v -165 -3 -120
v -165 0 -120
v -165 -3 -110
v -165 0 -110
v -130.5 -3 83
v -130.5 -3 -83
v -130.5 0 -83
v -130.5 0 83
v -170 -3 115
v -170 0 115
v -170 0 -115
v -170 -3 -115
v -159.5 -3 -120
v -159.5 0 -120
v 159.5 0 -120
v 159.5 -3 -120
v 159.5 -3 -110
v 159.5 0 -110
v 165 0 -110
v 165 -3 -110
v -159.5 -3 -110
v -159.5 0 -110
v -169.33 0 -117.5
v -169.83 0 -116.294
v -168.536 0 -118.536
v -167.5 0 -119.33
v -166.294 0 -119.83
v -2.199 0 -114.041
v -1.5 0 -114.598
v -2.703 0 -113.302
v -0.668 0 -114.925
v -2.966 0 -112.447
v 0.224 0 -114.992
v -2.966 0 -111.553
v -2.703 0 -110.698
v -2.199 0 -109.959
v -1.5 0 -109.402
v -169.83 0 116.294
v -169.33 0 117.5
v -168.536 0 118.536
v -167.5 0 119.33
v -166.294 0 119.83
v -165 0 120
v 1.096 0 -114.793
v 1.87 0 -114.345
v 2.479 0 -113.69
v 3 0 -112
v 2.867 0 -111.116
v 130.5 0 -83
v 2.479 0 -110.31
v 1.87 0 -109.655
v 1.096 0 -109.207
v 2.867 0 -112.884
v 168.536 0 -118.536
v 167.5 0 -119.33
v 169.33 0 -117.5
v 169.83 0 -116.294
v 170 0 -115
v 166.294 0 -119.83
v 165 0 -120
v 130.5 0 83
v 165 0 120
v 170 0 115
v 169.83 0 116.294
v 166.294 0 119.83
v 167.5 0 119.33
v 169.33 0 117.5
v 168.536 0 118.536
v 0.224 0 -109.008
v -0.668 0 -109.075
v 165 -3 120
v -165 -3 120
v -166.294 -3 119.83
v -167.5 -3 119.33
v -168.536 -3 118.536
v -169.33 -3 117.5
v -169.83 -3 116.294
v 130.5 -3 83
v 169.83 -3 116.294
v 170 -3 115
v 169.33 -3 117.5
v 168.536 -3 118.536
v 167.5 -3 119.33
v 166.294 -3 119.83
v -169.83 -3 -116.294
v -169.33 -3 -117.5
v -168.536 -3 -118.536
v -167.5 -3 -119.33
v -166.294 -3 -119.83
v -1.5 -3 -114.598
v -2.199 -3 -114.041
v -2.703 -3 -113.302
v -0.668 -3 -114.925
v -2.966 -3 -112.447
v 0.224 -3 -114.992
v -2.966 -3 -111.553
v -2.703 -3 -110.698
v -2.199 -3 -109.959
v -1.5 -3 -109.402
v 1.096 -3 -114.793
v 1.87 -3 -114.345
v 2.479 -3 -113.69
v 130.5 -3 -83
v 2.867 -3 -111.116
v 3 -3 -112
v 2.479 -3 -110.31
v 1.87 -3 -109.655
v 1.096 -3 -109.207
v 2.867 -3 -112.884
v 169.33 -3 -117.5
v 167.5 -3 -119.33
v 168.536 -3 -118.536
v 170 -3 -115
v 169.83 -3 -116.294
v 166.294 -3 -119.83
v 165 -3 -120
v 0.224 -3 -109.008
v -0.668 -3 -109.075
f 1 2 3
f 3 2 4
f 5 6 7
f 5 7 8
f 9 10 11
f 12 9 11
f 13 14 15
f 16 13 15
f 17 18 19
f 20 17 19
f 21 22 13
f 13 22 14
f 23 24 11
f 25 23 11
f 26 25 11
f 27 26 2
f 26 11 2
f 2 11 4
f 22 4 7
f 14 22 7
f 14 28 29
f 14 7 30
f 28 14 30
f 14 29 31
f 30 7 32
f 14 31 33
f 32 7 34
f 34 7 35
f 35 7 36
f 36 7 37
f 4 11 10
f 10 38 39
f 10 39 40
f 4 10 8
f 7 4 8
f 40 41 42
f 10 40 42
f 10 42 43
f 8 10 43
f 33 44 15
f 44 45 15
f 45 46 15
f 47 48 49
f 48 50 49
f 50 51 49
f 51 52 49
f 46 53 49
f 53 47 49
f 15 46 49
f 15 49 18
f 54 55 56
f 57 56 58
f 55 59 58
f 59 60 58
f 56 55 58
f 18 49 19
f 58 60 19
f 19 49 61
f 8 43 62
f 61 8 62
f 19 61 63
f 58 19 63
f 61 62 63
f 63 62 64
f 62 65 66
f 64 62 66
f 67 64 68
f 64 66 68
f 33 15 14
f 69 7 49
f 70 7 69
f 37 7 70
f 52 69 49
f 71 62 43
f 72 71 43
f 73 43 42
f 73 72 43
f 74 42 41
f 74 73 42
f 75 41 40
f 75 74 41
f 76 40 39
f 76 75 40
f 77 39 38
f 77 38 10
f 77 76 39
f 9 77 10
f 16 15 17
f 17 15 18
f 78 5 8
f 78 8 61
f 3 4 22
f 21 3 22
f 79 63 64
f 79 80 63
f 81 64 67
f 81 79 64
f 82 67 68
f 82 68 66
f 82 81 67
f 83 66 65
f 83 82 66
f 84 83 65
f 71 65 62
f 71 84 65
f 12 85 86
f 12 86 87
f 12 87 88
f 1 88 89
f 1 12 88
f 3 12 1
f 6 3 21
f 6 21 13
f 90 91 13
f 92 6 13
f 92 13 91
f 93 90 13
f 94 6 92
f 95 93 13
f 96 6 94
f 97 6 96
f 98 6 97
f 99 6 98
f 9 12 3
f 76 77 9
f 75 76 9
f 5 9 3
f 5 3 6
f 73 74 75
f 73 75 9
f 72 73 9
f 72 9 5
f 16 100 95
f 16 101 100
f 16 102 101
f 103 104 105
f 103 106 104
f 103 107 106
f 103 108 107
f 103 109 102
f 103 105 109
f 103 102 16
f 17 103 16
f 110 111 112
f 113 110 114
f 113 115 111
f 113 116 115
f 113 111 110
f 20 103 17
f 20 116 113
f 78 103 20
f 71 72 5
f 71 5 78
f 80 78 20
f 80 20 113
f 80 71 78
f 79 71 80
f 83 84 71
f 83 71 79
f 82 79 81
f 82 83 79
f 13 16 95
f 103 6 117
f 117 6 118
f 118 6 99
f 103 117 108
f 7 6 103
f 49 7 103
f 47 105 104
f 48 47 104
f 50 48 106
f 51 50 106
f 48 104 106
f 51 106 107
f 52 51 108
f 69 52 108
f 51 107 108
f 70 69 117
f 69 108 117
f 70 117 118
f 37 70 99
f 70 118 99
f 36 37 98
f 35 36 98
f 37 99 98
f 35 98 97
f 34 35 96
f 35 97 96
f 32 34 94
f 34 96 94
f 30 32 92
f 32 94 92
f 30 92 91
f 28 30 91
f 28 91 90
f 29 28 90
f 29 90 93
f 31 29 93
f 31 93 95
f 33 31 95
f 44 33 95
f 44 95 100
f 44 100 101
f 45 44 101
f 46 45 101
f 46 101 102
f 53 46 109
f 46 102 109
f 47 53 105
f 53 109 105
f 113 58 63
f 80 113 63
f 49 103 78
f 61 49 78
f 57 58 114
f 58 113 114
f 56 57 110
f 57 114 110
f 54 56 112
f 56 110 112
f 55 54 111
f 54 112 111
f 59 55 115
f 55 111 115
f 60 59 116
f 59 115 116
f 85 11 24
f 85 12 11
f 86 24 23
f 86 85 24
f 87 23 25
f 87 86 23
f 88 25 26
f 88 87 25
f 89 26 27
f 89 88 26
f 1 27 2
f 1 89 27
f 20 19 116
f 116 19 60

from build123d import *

# Parameters (mm, degrees)
F1_DEPTH = 3
F2_W     = 261
F2_H     = 166
F2_R     = 3
F3_DEPTH = 3
F4_R     = 4.99999


# Not quite as in the source:
# - a fillet or chamfer is up to 0.001 mm smaller than in the source, because OpenCascade refuses the exact size


with BuildPart() as f1:
    # F0 (on Front) → F1 (new body)
    with BuildSketch(Plane.XZ):
        Polygon((170, -120), (170, 120), (-170, 120), (-170, -120), (-165, -120), (-165, -110), (-159.5, -110), (-159.5, -120), (159.5, -120), (159.5, -110), (165, -110), (165, -120), align=None)
    extrude(amount=F1_DEPTH)

    # F2 (on face) → F3 (cut, through all)
    with BuildSketch(Plane.XZ.offset(3)):
        Rectangle(F2_W, F2_H)
        with Locations((0, -112)):
            Circle(F2_R)
    extrude(amount=-F3_DEPTH, mode=Mode.SUBTRACT)

    # F4 (radius 5 in the source; OpenCascade refuses exactly that, so slightly less here)
    f4_edges = [f1.edges().sort_by_distance(p)[0] for p in [
        (-170, -1.5, 120),
        (170, -1.5, 120),
        (170, -1.5, -120),
        (-170, -1.5, -120),
    ]]
    fillet(f4_edges, radius=F4_R)


solid = f1.part
